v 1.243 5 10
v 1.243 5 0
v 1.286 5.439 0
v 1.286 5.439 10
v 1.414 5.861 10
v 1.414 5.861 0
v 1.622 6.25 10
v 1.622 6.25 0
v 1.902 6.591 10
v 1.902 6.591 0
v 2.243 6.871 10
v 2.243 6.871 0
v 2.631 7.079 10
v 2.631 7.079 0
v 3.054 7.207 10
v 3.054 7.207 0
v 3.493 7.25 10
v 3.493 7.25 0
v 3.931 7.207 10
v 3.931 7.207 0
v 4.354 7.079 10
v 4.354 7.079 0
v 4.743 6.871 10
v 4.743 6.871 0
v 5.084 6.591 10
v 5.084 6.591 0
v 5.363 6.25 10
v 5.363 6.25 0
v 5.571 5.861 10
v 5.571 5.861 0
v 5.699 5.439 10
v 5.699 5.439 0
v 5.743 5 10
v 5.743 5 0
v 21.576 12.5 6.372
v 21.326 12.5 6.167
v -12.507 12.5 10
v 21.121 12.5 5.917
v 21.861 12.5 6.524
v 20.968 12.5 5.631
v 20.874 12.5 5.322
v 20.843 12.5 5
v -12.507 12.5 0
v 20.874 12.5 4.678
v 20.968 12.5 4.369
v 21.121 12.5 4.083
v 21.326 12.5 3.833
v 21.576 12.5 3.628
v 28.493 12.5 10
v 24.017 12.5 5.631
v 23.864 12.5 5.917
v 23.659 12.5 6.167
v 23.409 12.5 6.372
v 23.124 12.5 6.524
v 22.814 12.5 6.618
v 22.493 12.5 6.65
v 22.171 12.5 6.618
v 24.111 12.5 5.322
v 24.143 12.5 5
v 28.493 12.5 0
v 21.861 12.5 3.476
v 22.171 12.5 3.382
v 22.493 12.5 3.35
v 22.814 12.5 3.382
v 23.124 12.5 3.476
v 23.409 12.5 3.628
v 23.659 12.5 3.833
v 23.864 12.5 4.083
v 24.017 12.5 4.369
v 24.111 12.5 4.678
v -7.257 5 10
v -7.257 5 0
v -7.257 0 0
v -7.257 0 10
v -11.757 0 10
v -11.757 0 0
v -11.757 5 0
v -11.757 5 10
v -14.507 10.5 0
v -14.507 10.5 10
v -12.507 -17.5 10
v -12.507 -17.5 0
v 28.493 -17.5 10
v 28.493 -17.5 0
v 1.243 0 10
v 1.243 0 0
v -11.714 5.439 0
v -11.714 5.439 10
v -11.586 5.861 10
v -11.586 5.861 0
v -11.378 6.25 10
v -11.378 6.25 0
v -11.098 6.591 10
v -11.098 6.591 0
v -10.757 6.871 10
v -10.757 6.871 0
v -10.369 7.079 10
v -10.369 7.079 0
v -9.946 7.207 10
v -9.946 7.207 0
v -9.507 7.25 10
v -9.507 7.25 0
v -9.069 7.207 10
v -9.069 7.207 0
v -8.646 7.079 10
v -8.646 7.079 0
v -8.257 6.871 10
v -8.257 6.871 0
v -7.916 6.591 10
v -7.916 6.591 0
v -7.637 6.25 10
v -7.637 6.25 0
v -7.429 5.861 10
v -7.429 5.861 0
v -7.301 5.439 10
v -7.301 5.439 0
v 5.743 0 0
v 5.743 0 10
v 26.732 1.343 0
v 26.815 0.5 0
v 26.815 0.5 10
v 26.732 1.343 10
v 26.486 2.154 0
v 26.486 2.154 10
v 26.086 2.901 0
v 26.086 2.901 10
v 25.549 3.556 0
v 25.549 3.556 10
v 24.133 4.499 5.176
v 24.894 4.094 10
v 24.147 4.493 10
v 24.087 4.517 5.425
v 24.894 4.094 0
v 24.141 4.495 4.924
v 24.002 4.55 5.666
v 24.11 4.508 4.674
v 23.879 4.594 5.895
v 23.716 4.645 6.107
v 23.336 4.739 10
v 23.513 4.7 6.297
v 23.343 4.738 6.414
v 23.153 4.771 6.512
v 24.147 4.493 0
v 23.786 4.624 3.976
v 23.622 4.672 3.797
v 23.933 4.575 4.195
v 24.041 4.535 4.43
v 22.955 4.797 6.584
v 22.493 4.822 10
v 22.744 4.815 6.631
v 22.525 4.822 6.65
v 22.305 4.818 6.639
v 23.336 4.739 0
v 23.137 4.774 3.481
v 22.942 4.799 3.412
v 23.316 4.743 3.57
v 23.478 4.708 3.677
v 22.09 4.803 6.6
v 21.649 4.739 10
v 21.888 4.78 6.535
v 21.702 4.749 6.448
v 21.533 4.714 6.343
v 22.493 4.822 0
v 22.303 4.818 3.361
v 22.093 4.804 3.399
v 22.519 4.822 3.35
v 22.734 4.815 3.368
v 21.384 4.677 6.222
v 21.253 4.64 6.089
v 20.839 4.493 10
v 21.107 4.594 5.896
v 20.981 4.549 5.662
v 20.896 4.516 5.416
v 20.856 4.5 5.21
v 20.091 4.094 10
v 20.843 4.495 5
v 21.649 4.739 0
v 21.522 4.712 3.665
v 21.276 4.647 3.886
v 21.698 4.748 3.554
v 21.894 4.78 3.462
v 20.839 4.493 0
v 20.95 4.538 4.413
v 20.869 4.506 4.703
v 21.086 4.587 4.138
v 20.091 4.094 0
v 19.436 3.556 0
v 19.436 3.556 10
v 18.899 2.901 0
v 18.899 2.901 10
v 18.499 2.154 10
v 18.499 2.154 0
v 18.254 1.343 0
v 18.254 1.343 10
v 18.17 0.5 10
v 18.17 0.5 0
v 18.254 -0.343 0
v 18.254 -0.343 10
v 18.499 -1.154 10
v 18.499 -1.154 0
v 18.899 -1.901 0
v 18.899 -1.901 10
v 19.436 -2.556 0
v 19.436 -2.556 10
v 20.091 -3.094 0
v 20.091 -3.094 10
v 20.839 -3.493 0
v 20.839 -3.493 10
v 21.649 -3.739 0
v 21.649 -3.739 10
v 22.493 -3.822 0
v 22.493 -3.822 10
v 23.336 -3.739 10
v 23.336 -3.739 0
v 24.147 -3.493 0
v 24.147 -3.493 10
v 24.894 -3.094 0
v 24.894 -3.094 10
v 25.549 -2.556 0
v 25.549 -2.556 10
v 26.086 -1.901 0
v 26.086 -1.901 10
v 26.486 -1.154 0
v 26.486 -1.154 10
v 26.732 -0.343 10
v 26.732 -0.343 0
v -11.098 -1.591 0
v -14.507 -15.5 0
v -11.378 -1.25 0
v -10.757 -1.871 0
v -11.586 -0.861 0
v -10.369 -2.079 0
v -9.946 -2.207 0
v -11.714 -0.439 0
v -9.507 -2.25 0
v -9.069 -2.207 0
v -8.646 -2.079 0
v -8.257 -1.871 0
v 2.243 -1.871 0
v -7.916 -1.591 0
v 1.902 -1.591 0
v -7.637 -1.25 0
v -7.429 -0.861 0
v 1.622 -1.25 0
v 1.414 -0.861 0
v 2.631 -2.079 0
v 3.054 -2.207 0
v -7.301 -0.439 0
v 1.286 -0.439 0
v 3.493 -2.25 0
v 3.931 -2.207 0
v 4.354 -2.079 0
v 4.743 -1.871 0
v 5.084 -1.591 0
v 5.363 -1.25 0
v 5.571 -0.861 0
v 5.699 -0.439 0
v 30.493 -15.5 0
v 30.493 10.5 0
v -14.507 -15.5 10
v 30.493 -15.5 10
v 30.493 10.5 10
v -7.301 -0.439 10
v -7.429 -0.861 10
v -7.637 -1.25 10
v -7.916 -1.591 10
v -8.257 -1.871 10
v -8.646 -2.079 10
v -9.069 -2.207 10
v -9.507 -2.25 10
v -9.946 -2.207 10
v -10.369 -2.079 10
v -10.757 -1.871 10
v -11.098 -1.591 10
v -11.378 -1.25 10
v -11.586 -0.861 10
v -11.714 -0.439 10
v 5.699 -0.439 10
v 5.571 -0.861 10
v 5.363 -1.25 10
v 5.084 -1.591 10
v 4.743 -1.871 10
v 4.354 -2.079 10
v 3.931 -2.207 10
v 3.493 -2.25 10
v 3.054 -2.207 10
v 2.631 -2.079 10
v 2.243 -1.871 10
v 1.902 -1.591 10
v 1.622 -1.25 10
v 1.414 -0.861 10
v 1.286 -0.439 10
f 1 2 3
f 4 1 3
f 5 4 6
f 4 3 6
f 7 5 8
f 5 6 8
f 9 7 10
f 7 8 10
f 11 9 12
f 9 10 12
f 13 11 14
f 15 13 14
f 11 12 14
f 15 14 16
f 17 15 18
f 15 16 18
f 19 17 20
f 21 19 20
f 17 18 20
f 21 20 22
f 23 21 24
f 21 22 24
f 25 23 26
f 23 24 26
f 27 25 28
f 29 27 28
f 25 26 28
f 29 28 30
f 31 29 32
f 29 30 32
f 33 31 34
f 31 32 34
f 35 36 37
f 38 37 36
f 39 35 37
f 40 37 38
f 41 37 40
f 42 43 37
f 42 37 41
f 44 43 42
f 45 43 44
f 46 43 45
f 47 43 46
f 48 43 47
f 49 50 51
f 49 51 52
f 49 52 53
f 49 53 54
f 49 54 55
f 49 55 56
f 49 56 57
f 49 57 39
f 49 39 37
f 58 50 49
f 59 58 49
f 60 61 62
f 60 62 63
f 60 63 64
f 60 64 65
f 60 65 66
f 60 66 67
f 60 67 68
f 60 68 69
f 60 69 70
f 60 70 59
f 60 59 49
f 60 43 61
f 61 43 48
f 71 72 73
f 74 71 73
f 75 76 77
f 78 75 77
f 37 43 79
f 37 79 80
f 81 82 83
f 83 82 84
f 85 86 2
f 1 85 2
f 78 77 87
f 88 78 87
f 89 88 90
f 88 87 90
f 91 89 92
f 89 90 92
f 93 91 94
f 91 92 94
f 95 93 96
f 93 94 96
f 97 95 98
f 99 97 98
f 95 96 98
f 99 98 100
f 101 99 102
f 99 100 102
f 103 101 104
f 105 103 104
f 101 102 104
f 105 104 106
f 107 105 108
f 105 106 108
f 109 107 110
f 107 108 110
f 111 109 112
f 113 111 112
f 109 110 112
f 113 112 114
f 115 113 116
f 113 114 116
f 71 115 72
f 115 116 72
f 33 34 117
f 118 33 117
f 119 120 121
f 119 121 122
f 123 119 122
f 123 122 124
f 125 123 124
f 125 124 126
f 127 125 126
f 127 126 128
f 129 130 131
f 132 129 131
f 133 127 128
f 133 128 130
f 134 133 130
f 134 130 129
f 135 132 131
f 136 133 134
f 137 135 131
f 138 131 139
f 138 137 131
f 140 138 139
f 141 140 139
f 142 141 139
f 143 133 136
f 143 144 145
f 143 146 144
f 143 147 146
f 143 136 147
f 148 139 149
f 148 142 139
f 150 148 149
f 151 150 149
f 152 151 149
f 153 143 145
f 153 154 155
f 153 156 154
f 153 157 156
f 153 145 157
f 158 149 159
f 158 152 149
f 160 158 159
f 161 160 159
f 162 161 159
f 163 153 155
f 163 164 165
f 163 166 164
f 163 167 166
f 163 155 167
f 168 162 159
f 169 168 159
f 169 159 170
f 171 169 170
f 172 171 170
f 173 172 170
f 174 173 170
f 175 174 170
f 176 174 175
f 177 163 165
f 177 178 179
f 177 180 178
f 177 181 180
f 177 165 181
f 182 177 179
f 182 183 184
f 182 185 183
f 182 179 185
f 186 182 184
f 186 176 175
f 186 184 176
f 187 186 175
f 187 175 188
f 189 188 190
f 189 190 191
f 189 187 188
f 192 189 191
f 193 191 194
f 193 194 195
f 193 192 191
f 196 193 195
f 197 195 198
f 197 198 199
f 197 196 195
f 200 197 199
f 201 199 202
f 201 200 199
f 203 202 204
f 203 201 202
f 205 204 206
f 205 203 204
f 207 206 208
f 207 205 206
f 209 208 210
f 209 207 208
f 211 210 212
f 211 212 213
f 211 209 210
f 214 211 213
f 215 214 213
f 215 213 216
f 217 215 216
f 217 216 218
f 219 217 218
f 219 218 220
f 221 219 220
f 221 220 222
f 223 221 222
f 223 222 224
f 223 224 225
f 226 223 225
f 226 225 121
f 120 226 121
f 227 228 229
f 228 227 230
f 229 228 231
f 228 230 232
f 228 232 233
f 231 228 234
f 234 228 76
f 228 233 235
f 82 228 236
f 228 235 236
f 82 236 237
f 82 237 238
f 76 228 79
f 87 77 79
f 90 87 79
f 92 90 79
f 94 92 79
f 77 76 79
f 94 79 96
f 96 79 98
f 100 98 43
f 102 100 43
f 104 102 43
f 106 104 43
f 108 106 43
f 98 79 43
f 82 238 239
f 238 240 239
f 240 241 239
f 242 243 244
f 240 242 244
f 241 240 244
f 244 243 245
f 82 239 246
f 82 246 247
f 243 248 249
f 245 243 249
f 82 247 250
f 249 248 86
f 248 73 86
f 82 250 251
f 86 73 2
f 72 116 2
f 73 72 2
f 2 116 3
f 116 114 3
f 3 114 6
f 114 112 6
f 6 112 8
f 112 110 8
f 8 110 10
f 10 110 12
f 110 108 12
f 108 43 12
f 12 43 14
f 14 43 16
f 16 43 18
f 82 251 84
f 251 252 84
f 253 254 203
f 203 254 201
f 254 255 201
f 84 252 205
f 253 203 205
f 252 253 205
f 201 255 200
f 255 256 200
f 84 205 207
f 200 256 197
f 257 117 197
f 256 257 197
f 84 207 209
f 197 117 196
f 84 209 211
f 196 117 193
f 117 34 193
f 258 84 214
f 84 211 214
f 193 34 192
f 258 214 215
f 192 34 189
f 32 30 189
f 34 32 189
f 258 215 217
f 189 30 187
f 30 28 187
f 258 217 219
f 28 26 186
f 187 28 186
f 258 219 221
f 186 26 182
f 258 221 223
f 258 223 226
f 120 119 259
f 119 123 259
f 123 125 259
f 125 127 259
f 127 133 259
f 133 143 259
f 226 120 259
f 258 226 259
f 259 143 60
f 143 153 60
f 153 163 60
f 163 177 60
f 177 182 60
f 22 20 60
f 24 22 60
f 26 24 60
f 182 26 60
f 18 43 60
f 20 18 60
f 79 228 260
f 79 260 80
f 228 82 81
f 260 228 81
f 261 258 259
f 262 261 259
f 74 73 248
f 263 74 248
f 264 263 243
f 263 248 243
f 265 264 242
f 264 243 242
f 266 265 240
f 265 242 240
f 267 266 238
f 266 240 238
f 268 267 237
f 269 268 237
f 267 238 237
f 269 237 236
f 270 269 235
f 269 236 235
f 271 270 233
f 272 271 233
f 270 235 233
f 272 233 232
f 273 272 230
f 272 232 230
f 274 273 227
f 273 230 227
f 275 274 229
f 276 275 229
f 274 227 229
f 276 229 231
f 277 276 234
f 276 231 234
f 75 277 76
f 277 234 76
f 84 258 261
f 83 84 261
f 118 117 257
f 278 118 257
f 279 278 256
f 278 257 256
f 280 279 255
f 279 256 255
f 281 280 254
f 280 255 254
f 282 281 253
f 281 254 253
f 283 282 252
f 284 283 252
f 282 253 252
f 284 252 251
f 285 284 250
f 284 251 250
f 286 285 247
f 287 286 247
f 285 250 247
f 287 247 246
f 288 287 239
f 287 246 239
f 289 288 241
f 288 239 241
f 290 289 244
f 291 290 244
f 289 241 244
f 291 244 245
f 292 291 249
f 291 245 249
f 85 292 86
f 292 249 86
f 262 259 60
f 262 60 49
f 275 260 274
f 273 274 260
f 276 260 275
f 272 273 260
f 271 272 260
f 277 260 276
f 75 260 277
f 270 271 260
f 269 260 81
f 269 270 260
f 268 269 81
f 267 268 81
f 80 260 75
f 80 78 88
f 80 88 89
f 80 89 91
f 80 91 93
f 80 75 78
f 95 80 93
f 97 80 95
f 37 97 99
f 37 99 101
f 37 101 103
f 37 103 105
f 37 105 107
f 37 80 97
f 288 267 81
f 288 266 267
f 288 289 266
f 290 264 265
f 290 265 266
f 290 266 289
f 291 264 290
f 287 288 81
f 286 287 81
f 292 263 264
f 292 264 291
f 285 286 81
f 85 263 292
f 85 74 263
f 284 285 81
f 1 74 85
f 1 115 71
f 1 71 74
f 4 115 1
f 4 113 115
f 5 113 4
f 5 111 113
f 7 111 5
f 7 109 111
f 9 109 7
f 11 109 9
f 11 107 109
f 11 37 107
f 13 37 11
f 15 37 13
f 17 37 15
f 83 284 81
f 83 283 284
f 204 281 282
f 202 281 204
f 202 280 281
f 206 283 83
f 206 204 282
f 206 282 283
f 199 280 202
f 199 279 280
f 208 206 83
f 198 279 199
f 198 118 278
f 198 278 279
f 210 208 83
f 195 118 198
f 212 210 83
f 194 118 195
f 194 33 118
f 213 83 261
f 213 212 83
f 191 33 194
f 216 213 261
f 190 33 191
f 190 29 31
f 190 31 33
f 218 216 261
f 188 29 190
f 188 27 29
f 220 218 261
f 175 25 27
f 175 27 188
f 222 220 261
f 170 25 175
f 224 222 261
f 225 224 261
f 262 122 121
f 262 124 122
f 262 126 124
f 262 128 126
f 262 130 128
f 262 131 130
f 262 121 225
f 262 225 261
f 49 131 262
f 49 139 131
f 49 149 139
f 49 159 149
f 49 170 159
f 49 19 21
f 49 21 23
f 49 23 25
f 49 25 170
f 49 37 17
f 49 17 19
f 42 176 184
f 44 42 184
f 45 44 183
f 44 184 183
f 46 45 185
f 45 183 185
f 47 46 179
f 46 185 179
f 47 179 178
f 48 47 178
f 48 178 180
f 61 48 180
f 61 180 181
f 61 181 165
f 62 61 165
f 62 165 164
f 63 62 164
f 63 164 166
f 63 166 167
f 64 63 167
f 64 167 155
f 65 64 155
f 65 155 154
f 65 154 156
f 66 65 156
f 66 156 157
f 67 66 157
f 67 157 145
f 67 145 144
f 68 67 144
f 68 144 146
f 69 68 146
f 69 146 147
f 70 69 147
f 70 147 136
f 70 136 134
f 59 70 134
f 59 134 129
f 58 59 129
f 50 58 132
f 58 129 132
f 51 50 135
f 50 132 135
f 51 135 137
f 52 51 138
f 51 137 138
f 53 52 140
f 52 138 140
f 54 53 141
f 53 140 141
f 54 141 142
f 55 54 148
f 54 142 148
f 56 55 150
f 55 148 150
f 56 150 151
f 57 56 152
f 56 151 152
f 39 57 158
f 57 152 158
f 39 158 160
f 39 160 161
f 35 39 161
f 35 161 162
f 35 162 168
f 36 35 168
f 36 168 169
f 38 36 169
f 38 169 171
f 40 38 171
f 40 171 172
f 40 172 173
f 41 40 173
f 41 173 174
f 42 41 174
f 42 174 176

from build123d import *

# Parameters (mm, degrees)
SKETCH1_W             = 45
SKETCH1_H             = 30
SKETCH1_R             = 4.32205537
BOSS_EXTRUDE1_DEPTH   = 10
M4_TAPPED_HOLE1_D     = 3.3
M4_TAPPED_HOLE1_DEPTH = 10.1
M4_TAPPED_HOLE1_TIP   = 0.991420021
CHAMFER2_SIZE         = 2


with BuildPart() as part:
    # Sketch1 → Boss-Extrude1 (new body)
    with BuildSketch(Plane.XY):
        with Locations((7.992537313, -2.5)):
            Rectangle(SKETCH1_W, SKETCH1_H)
        with Locations((22.492537313, 0.5)):
            Circle(SKETCH1_R, mode=Mode.SUBTRACT)
        with BuildLine():
            Line((-7.257462687, 5), (-7.257462687, 0))
            ThreePointArc((-7.257462687, 0), (-9.507462687, -2.25), (-11.757462687, 0))
            Line((-11.757462687, 0), (-11.757462687, 5))
            ThreePointArc((-11.757462687, 5), (-9.507462687, 7.25), (-7.257462687, 5))
        make_face(mode=Mode.SUBTRACT)
        with BuildLine():
            Line((5.742537313, 5), (5.742537313, 0))
            ThreePointArc((5.742537313, 0), (3.492537313, -2.25), (1.242537313, 0))
            Line((1.242537313, 0), (1.242537313, 5))
            ThreePointArc((1.242537313, 5), (3.492537313, 7.25), (5.742537313, 5))
        make_face(mode=Mode.SUBTRACT)
    extrude(amount=BOSS_EXTRUDE1_DEPTH)

    # M4 Tapped Hole1
    with Locations(Plane(origin=(0, 12.5, 0), x_dir=(1, 0, 0), z_dir=(0, 1, 0))):
        with Locations((22.492537313, -5)):
            Hole(M4_TAPPED_HOLE1_D / 2, depth=M4_TAPPED_HOLE1_DEPTH)
            with Locations((0, 0, -(M4_TAPPED_HOLE1_DEPTH + M4_TAPPED_HOLE1_TIP / 2))):  # 118° drill point
                Cone(0, M4_TAPPED_HOLE1_D / 2, M4_TAPPED_HOLE1_TIP, mode=Mode.SUBTRACT)

    # Chamfer2
    chamfer2_edges = [part.edges().sort_by_distance(p)[0] for p in [
        (-14.507462687, 12.5, 5),
        (30.492537313, 12.5, 5),
        (30.492537313, -17.5, 5),
        (-14.507462687, -17.5, 5),
    ]]
    chamfer(chamfer2_edges, length=CHAMFER2_SIZE)


solid = part.part
